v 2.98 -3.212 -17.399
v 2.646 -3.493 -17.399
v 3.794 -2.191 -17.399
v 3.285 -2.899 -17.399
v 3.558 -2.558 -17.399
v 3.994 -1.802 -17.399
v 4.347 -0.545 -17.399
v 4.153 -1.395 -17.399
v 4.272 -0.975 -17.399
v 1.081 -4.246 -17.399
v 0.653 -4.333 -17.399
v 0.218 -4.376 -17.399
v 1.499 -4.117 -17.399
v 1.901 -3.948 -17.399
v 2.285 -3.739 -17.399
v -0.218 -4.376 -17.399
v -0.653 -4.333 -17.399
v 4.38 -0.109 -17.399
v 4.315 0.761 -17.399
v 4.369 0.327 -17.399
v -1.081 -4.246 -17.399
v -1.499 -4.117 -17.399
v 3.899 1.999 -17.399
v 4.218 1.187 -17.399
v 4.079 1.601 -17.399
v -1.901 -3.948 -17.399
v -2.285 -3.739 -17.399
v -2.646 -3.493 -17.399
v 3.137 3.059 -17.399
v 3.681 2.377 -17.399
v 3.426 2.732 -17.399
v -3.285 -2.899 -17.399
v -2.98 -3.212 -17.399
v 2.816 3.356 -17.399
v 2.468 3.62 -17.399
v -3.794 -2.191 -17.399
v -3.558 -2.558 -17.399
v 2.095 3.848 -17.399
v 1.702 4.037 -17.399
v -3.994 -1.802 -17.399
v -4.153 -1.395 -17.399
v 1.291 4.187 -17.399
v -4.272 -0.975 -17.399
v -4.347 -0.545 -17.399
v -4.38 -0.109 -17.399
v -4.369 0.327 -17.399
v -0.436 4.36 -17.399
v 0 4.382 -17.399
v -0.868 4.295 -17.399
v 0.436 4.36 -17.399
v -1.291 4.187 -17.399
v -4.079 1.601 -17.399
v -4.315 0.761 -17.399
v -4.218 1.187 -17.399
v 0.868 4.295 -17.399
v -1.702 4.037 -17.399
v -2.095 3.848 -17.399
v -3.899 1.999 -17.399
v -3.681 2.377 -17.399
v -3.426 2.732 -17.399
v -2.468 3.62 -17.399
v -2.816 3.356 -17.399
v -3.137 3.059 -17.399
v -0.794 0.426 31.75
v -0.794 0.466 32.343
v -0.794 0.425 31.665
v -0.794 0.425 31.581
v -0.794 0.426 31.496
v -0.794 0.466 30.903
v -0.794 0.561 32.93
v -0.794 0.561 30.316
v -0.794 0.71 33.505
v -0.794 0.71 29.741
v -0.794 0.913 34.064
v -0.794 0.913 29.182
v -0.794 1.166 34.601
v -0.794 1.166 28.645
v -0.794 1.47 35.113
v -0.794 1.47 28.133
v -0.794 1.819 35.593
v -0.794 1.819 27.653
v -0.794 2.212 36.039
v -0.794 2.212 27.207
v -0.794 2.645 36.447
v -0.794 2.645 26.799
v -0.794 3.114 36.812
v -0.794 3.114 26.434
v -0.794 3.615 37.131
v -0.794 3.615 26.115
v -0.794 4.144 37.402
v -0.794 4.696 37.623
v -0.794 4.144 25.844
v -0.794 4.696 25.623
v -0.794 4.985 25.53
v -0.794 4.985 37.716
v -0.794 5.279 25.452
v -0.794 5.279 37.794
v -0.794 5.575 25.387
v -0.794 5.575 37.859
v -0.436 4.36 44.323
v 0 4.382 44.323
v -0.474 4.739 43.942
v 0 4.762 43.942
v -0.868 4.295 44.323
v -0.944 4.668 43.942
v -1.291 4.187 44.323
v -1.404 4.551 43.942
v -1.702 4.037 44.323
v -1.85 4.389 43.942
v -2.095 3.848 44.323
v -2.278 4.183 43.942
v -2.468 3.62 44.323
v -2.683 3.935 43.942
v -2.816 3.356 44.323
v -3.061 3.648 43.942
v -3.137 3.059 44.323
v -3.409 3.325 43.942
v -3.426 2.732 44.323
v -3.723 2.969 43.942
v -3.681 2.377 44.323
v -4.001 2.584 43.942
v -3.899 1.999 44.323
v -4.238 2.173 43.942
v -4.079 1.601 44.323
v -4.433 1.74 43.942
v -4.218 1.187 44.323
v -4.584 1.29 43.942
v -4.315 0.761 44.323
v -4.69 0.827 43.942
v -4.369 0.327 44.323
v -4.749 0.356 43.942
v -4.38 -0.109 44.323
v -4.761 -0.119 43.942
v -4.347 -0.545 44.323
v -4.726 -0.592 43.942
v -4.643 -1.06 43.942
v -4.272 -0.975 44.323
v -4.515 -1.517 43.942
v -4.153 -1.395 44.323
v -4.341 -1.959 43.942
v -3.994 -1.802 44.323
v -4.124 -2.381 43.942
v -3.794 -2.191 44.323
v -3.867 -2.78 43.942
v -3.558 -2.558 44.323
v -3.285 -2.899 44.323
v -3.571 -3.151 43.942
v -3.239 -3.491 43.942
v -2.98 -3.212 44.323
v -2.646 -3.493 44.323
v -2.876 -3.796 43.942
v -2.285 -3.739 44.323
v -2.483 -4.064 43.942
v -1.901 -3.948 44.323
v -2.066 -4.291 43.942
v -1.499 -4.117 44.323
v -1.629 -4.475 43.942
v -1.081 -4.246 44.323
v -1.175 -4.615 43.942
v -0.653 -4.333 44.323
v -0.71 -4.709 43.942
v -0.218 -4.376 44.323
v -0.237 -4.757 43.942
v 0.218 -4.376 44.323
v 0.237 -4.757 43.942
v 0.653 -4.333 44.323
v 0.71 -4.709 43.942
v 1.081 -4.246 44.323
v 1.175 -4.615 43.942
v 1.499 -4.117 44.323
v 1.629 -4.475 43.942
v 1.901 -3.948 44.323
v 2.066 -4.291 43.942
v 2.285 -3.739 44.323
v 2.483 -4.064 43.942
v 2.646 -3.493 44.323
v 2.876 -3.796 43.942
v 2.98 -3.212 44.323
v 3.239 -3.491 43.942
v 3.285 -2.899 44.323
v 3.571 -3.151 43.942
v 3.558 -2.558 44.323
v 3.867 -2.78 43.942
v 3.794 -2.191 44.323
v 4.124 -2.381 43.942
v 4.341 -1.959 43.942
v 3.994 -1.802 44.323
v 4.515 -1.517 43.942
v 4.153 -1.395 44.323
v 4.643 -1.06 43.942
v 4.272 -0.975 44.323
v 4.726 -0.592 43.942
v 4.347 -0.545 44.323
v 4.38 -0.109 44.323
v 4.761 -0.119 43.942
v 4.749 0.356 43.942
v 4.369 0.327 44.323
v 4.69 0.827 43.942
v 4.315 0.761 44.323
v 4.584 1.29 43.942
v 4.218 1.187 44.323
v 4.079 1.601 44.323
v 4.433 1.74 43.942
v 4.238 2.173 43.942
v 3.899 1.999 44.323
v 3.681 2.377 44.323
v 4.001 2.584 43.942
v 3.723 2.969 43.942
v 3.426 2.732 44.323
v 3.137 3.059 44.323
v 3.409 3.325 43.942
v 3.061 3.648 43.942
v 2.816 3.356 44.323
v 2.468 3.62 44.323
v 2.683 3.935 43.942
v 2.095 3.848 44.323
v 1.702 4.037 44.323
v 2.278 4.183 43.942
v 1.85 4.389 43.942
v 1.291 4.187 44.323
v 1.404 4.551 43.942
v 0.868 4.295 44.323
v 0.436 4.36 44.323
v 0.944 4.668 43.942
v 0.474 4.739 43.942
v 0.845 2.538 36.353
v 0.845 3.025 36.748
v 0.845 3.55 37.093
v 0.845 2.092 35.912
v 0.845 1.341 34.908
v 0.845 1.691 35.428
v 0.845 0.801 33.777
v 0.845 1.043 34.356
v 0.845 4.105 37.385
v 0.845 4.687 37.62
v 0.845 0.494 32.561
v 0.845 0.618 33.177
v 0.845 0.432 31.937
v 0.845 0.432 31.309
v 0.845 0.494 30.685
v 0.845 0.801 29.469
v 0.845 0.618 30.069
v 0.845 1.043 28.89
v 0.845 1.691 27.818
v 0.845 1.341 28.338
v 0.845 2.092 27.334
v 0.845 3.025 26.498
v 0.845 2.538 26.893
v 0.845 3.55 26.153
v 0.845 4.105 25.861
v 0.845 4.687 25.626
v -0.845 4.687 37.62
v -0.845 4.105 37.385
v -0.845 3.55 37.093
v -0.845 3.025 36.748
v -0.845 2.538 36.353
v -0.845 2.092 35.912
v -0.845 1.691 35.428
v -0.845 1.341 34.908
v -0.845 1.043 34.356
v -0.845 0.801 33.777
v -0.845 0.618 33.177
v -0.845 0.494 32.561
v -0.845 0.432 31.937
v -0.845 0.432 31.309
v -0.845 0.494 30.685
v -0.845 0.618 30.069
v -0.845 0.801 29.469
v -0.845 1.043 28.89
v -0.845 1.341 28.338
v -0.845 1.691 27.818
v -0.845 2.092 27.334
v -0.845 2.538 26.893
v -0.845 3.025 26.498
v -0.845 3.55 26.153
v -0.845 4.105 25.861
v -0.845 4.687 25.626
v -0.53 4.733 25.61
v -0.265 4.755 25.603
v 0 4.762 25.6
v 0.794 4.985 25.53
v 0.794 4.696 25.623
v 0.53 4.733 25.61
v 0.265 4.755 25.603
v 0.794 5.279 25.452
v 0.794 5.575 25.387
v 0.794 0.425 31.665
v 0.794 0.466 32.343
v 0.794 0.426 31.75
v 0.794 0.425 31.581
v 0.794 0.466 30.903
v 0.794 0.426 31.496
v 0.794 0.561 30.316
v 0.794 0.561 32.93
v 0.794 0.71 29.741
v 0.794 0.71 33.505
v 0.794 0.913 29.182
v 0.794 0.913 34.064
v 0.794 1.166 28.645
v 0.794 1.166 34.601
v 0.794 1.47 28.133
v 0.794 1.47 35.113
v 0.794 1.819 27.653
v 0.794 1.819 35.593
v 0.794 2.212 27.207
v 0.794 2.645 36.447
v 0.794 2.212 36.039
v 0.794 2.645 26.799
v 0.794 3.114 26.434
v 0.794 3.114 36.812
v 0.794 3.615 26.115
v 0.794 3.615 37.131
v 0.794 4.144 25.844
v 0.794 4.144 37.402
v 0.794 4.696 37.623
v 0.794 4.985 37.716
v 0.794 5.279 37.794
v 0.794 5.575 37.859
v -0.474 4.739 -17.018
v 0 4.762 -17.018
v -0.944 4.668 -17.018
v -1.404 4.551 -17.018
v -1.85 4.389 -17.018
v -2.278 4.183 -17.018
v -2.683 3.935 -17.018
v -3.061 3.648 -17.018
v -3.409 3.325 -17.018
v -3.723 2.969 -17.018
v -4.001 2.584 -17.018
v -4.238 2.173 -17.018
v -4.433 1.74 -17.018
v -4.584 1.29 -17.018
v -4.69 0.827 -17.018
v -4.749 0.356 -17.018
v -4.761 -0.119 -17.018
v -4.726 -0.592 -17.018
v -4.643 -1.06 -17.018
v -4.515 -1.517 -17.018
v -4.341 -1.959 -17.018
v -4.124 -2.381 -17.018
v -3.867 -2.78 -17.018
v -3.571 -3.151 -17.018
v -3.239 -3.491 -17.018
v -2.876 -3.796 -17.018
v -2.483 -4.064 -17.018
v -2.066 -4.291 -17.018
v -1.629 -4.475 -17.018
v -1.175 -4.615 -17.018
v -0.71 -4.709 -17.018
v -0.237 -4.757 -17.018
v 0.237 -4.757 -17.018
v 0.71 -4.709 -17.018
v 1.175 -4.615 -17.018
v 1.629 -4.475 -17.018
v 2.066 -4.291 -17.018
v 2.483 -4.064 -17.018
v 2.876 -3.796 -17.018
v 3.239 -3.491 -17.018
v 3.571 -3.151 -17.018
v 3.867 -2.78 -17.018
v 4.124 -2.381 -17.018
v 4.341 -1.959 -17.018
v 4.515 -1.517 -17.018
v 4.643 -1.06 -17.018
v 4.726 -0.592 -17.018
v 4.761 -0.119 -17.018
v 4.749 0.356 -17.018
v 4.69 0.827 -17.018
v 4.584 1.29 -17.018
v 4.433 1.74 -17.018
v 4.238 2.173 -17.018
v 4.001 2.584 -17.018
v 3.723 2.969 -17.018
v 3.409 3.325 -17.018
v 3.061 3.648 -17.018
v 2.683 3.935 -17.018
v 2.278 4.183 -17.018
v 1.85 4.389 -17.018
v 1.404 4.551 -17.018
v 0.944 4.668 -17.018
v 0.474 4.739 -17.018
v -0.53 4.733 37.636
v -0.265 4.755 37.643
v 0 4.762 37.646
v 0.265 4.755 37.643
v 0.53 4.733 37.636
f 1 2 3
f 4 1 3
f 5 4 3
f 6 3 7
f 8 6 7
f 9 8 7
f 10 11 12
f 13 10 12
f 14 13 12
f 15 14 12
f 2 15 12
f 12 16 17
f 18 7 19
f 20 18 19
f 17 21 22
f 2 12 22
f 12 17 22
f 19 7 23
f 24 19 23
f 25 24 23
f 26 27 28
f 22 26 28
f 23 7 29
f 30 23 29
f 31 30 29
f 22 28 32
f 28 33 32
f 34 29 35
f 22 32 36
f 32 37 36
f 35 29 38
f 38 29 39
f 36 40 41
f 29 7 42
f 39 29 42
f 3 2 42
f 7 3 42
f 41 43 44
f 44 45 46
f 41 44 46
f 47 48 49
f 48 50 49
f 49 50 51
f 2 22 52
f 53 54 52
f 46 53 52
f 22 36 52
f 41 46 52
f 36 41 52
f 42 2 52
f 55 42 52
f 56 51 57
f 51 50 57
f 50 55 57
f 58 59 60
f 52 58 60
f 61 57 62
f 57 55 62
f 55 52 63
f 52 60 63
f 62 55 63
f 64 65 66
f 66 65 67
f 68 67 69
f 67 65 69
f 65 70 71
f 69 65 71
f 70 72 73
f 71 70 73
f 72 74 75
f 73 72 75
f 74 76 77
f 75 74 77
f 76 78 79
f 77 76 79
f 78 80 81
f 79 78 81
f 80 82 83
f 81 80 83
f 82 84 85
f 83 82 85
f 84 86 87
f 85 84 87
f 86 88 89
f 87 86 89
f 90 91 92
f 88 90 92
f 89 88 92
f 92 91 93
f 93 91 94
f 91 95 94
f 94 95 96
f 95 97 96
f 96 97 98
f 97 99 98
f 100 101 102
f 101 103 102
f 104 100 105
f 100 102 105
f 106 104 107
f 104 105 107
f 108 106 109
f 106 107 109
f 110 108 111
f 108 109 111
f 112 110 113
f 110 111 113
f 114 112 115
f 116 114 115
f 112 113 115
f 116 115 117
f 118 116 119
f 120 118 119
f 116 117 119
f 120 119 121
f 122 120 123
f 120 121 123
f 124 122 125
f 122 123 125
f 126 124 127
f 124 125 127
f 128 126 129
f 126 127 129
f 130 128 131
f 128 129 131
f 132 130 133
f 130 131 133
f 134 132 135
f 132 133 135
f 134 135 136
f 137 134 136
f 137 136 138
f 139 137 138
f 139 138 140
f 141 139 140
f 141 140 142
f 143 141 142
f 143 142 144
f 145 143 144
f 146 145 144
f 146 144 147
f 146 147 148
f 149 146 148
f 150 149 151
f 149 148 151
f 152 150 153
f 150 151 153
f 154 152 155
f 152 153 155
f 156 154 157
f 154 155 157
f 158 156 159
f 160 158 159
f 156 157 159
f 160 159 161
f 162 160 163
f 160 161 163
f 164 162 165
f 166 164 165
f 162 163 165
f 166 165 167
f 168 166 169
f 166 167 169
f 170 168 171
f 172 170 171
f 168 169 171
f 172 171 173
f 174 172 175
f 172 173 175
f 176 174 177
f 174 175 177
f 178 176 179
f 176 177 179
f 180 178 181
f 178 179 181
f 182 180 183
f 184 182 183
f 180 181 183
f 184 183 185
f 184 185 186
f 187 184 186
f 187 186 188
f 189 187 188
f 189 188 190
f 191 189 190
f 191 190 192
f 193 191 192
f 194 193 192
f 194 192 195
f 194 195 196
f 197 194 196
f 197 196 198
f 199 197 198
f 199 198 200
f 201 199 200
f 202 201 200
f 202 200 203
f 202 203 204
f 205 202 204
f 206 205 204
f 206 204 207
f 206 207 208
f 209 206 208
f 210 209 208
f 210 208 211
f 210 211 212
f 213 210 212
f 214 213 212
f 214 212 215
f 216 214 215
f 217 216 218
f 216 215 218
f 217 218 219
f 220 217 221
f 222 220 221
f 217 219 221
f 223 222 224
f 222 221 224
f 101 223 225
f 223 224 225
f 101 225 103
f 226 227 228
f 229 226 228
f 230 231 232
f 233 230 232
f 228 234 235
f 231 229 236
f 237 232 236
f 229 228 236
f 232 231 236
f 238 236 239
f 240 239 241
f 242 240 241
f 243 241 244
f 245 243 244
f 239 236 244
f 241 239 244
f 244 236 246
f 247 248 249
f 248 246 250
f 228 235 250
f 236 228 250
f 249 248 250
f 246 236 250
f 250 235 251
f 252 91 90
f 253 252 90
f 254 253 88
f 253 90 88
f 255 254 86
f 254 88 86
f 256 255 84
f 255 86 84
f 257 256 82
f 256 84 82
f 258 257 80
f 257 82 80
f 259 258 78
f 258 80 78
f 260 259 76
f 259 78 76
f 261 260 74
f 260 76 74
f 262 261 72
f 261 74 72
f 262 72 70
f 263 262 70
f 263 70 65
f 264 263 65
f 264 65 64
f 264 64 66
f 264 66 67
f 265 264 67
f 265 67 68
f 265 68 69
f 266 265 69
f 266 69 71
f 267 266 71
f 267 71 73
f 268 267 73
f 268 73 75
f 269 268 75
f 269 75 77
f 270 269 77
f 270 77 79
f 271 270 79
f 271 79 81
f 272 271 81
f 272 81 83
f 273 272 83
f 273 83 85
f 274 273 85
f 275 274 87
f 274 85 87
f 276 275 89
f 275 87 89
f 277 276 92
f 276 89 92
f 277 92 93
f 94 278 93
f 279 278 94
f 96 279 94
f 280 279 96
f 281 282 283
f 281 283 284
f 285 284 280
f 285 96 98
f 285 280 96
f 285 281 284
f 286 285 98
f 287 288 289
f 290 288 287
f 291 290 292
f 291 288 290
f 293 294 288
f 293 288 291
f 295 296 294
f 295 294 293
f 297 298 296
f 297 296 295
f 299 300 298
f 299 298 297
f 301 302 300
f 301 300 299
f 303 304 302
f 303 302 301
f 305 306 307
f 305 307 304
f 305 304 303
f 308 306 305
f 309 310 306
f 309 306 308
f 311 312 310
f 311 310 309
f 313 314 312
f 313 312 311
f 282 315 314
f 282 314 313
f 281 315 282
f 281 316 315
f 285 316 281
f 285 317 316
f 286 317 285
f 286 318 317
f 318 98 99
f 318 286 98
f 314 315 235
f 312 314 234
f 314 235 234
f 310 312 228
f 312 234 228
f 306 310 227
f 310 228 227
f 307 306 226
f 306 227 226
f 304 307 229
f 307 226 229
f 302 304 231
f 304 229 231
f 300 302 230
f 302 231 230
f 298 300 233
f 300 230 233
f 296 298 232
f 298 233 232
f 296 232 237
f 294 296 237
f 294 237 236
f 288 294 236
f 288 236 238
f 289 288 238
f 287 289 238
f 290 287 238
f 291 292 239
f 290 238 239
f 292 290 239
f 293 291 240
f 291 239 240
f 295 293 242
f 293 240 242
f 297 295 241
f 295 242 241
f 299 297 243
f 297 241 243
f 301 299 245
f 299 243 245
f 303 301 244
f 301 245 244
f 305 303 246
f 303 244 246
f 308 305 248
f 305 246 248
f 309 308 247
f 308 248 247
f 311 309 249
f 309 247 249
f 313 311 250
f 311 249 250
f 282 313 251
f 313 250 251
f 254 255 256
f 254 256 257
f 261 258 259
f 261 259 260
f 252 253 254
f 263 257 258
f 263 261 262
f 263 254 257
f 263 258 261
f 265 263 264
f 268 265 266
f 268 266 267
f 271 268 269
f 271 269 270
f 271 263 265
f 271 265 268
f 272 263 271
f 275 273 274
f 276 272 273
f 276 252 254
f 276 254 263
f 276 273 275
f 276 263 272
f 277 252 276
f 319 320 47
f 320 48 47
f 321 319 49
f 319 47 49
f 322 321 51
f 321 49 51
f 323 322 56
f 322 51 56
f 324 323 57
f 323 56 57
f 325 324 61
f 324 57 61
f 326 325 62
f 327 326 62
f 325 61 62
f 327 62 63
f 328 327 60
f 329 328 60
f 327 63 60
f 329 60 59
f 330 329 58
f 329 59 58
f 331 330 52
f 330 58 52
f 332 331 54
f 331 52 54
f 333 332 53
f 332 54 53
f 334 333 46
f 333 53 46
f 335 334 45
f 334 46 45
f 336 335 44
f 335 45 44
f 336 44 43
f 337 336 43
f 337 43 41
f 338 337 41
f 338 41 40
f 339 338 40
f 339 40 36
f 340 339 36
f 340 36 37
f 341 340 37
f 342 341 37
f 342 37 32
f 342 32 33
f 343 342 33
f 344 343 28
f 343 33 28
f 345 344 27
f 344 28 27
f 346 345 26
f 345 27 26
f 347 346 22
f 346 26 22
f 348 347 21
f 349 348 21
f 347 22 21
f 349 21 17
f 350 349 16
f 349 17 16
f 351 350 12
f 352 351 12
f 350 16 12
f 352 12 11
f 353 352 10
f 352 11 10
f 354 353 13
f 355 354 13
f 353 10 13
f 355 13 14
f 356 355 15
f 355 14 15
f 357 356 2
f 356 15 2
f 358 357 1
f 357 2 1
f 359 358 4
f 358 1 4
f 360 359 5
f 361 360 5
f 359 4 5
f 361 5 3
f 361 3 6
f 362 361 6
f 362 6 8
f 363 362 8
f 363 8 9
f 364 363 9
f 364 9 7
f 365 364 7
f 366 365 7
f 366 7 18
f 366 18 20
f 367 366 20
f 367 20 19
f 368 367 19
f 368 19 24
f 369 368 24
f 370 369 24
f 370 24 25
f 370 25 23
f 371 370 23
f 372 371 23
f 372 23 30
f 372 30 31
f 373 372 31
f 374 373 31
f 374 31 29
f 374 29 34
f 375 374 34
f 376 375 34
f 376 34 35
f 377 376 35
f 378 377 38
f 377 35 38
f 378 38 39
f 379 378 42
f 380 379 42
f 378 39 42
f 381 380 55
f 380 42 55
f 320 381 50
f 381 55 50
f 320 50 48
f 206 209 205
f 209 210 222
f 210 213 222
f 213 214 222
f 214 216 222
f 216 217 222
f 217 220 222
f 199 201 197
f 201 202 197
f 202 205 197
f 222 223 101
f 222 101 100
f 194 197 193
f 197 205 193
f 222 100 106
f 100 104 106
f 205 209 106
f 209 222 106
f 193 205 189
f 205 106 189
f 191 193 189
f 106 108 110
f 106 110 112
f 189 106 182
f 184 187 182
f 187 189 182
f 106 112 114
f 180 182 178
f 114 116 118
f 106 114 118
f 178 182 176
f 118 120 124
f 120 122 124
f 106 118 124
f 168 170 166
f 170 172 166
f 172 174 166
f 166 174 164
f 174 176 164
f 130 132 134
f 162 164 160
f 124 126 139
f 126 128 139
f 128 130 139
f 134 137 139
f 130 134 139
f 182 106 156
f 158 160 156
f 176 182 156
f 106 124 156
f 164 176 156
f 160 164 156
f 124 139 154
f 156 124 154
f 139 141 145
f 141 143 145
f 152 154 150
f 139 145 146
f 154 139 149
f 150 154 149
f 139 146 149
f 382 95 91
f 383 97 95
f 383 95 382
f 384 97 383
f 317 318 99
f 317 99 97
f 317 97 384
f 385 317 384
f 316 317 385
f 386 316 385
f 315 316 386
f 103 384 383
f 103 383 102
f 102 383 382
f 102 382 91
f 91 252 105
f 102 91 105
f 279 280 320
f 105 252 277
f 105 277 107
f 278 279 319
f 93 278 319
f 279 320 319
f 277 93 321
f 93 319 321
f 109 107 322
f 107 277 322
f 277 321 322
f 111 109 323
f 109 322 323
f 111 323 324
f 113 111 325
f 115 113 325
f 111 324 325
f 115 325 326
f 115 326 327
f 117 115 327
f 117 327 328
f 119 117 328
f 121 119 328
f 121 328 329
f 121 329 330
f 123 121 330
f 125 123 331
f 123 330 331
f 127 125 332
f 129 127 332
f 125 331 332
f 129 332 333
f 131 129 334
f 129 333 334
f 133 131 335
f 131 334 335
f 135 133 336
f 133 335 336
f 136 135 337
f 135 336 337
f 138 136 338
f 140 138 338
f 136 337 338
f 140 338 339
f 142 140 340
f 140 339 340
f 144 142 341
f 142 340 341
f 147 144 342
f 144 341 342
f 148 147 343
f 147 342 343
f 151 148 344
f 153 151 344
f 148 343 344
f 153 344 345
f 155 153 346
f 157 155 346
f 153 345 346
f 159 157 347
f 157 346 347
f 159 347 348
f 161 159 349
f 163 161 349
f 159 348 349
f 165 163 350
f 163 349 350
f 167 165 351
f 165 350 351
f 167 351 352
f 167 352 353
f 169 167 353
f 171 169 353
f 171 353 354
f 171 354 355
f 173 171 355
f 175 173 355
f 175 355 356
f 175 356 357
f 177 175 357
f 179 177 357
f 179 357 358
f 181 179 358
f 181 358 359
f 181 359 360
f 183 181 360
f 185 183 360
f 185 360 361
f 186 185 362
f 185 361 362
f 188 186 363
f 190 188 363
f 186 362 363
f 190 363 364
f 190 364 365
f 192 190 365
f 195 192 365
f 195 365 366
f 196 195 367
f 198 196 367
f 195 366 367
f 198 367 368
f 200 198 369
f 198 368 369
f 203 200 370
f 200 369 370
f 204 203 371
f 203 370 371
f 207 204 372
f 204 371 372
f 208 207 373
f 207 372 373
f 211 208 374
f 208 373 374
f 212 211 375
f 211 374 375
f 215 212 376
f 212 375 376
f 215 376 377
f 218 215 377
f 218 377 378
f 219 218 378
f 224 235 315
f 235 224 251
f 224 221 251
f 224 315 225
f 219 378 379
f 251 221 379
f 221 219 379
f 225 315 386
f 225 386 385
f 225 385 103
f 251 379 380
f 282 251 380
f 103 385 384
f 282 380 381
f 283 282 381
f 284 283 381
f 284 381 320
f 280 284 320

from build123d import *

# Parameters (mm, degrees)
CUT_EXTRUDE1_DEPTH       = 0.84455
CUT_EXTRUDE1_DEPTH_BACK  = 0.84455
BOSS_EXTRUDE1_DEPTH      = 0.79375
BOSS_EXTRUDE1_DEPTH_BACK = 0.79375


with BuildPart() as part:
    # Sketch1 → Revolve1 (revolve)
    with BuildSketch(Plane(origin=(0, 0, 0), x_dir=(0, 0, -1), z_dir=(1, 0, 0))):
        Polygon((-44.323, 0), (-44.323, 4.3815), (-43.942, 4.7625), (17.018, 4.7625), (17.399, 4.3815), (17.399, 0), align=None)
    revolve(axis=Axis((0, 0, -17.399), (0, 0, 1)))

    # Sketch2 → Cut-Extrude1 (cut, two sides: drawn at the far end of the back side and taken through both)
    with BuildSketch(Plane(origin=(0, 0, 0), x_dir=(0, 0, -1), z_dir=(1, 0, 0)).offset(-CUT_EXTRUDE1_DEPTH_BACK)):
        with BuildLine():
            Line((-25.3873, 5.5753), (-37.8587, 5.5753))
            ThreePointArc((-37.8587, 5.5753), (-31.623, 0.424693809), (-25.3873, 5.5753))
        make_face()
    extrude(amount=CUT_EXTRUDE1_DEPTH + CUT_EXTRUDE1_DEPTH_BACK, mode=Mode.SUBTRACT)

    # Sketch3 → Boss-Extrude1 (add, two sides: drawn at the far end of the back side and taken through both)
    with BuildSketch(Plane(origin=(0, 0, 0), x_dir=(0, 0, -1), z_dir=(1, 0, 0)).offset(-BOSS_EXTRUDE1_DEPTH_BACK)):
        with BuildLine():
            Line((-31.75, 0.425963936), (-31.75, 0.169400396))
            Line((-31.75, 0.169400396), (-31.496, 0.169400396))
            Line((-31.496, 0.169400396), (-31.496, 0.425963936))
            ThreePointArc((-31.496, 0.425963936), (-27.530335428, 1.919531948), (-25.3873, 5.5753))
            Line((-25.3873, 5.5753), (-37.8587, 5.5753))
            ThreePointArc((-37.8587, 5.5753), (-35.715664572, 1.919531948), (-31.75, 0.425963936))
        make_face()
    extrude(amount=BOSS_EXTRUDE1_DEPTH + BOSS_EXTRUDE1_DEPTH_BACK)


solid = part.part
